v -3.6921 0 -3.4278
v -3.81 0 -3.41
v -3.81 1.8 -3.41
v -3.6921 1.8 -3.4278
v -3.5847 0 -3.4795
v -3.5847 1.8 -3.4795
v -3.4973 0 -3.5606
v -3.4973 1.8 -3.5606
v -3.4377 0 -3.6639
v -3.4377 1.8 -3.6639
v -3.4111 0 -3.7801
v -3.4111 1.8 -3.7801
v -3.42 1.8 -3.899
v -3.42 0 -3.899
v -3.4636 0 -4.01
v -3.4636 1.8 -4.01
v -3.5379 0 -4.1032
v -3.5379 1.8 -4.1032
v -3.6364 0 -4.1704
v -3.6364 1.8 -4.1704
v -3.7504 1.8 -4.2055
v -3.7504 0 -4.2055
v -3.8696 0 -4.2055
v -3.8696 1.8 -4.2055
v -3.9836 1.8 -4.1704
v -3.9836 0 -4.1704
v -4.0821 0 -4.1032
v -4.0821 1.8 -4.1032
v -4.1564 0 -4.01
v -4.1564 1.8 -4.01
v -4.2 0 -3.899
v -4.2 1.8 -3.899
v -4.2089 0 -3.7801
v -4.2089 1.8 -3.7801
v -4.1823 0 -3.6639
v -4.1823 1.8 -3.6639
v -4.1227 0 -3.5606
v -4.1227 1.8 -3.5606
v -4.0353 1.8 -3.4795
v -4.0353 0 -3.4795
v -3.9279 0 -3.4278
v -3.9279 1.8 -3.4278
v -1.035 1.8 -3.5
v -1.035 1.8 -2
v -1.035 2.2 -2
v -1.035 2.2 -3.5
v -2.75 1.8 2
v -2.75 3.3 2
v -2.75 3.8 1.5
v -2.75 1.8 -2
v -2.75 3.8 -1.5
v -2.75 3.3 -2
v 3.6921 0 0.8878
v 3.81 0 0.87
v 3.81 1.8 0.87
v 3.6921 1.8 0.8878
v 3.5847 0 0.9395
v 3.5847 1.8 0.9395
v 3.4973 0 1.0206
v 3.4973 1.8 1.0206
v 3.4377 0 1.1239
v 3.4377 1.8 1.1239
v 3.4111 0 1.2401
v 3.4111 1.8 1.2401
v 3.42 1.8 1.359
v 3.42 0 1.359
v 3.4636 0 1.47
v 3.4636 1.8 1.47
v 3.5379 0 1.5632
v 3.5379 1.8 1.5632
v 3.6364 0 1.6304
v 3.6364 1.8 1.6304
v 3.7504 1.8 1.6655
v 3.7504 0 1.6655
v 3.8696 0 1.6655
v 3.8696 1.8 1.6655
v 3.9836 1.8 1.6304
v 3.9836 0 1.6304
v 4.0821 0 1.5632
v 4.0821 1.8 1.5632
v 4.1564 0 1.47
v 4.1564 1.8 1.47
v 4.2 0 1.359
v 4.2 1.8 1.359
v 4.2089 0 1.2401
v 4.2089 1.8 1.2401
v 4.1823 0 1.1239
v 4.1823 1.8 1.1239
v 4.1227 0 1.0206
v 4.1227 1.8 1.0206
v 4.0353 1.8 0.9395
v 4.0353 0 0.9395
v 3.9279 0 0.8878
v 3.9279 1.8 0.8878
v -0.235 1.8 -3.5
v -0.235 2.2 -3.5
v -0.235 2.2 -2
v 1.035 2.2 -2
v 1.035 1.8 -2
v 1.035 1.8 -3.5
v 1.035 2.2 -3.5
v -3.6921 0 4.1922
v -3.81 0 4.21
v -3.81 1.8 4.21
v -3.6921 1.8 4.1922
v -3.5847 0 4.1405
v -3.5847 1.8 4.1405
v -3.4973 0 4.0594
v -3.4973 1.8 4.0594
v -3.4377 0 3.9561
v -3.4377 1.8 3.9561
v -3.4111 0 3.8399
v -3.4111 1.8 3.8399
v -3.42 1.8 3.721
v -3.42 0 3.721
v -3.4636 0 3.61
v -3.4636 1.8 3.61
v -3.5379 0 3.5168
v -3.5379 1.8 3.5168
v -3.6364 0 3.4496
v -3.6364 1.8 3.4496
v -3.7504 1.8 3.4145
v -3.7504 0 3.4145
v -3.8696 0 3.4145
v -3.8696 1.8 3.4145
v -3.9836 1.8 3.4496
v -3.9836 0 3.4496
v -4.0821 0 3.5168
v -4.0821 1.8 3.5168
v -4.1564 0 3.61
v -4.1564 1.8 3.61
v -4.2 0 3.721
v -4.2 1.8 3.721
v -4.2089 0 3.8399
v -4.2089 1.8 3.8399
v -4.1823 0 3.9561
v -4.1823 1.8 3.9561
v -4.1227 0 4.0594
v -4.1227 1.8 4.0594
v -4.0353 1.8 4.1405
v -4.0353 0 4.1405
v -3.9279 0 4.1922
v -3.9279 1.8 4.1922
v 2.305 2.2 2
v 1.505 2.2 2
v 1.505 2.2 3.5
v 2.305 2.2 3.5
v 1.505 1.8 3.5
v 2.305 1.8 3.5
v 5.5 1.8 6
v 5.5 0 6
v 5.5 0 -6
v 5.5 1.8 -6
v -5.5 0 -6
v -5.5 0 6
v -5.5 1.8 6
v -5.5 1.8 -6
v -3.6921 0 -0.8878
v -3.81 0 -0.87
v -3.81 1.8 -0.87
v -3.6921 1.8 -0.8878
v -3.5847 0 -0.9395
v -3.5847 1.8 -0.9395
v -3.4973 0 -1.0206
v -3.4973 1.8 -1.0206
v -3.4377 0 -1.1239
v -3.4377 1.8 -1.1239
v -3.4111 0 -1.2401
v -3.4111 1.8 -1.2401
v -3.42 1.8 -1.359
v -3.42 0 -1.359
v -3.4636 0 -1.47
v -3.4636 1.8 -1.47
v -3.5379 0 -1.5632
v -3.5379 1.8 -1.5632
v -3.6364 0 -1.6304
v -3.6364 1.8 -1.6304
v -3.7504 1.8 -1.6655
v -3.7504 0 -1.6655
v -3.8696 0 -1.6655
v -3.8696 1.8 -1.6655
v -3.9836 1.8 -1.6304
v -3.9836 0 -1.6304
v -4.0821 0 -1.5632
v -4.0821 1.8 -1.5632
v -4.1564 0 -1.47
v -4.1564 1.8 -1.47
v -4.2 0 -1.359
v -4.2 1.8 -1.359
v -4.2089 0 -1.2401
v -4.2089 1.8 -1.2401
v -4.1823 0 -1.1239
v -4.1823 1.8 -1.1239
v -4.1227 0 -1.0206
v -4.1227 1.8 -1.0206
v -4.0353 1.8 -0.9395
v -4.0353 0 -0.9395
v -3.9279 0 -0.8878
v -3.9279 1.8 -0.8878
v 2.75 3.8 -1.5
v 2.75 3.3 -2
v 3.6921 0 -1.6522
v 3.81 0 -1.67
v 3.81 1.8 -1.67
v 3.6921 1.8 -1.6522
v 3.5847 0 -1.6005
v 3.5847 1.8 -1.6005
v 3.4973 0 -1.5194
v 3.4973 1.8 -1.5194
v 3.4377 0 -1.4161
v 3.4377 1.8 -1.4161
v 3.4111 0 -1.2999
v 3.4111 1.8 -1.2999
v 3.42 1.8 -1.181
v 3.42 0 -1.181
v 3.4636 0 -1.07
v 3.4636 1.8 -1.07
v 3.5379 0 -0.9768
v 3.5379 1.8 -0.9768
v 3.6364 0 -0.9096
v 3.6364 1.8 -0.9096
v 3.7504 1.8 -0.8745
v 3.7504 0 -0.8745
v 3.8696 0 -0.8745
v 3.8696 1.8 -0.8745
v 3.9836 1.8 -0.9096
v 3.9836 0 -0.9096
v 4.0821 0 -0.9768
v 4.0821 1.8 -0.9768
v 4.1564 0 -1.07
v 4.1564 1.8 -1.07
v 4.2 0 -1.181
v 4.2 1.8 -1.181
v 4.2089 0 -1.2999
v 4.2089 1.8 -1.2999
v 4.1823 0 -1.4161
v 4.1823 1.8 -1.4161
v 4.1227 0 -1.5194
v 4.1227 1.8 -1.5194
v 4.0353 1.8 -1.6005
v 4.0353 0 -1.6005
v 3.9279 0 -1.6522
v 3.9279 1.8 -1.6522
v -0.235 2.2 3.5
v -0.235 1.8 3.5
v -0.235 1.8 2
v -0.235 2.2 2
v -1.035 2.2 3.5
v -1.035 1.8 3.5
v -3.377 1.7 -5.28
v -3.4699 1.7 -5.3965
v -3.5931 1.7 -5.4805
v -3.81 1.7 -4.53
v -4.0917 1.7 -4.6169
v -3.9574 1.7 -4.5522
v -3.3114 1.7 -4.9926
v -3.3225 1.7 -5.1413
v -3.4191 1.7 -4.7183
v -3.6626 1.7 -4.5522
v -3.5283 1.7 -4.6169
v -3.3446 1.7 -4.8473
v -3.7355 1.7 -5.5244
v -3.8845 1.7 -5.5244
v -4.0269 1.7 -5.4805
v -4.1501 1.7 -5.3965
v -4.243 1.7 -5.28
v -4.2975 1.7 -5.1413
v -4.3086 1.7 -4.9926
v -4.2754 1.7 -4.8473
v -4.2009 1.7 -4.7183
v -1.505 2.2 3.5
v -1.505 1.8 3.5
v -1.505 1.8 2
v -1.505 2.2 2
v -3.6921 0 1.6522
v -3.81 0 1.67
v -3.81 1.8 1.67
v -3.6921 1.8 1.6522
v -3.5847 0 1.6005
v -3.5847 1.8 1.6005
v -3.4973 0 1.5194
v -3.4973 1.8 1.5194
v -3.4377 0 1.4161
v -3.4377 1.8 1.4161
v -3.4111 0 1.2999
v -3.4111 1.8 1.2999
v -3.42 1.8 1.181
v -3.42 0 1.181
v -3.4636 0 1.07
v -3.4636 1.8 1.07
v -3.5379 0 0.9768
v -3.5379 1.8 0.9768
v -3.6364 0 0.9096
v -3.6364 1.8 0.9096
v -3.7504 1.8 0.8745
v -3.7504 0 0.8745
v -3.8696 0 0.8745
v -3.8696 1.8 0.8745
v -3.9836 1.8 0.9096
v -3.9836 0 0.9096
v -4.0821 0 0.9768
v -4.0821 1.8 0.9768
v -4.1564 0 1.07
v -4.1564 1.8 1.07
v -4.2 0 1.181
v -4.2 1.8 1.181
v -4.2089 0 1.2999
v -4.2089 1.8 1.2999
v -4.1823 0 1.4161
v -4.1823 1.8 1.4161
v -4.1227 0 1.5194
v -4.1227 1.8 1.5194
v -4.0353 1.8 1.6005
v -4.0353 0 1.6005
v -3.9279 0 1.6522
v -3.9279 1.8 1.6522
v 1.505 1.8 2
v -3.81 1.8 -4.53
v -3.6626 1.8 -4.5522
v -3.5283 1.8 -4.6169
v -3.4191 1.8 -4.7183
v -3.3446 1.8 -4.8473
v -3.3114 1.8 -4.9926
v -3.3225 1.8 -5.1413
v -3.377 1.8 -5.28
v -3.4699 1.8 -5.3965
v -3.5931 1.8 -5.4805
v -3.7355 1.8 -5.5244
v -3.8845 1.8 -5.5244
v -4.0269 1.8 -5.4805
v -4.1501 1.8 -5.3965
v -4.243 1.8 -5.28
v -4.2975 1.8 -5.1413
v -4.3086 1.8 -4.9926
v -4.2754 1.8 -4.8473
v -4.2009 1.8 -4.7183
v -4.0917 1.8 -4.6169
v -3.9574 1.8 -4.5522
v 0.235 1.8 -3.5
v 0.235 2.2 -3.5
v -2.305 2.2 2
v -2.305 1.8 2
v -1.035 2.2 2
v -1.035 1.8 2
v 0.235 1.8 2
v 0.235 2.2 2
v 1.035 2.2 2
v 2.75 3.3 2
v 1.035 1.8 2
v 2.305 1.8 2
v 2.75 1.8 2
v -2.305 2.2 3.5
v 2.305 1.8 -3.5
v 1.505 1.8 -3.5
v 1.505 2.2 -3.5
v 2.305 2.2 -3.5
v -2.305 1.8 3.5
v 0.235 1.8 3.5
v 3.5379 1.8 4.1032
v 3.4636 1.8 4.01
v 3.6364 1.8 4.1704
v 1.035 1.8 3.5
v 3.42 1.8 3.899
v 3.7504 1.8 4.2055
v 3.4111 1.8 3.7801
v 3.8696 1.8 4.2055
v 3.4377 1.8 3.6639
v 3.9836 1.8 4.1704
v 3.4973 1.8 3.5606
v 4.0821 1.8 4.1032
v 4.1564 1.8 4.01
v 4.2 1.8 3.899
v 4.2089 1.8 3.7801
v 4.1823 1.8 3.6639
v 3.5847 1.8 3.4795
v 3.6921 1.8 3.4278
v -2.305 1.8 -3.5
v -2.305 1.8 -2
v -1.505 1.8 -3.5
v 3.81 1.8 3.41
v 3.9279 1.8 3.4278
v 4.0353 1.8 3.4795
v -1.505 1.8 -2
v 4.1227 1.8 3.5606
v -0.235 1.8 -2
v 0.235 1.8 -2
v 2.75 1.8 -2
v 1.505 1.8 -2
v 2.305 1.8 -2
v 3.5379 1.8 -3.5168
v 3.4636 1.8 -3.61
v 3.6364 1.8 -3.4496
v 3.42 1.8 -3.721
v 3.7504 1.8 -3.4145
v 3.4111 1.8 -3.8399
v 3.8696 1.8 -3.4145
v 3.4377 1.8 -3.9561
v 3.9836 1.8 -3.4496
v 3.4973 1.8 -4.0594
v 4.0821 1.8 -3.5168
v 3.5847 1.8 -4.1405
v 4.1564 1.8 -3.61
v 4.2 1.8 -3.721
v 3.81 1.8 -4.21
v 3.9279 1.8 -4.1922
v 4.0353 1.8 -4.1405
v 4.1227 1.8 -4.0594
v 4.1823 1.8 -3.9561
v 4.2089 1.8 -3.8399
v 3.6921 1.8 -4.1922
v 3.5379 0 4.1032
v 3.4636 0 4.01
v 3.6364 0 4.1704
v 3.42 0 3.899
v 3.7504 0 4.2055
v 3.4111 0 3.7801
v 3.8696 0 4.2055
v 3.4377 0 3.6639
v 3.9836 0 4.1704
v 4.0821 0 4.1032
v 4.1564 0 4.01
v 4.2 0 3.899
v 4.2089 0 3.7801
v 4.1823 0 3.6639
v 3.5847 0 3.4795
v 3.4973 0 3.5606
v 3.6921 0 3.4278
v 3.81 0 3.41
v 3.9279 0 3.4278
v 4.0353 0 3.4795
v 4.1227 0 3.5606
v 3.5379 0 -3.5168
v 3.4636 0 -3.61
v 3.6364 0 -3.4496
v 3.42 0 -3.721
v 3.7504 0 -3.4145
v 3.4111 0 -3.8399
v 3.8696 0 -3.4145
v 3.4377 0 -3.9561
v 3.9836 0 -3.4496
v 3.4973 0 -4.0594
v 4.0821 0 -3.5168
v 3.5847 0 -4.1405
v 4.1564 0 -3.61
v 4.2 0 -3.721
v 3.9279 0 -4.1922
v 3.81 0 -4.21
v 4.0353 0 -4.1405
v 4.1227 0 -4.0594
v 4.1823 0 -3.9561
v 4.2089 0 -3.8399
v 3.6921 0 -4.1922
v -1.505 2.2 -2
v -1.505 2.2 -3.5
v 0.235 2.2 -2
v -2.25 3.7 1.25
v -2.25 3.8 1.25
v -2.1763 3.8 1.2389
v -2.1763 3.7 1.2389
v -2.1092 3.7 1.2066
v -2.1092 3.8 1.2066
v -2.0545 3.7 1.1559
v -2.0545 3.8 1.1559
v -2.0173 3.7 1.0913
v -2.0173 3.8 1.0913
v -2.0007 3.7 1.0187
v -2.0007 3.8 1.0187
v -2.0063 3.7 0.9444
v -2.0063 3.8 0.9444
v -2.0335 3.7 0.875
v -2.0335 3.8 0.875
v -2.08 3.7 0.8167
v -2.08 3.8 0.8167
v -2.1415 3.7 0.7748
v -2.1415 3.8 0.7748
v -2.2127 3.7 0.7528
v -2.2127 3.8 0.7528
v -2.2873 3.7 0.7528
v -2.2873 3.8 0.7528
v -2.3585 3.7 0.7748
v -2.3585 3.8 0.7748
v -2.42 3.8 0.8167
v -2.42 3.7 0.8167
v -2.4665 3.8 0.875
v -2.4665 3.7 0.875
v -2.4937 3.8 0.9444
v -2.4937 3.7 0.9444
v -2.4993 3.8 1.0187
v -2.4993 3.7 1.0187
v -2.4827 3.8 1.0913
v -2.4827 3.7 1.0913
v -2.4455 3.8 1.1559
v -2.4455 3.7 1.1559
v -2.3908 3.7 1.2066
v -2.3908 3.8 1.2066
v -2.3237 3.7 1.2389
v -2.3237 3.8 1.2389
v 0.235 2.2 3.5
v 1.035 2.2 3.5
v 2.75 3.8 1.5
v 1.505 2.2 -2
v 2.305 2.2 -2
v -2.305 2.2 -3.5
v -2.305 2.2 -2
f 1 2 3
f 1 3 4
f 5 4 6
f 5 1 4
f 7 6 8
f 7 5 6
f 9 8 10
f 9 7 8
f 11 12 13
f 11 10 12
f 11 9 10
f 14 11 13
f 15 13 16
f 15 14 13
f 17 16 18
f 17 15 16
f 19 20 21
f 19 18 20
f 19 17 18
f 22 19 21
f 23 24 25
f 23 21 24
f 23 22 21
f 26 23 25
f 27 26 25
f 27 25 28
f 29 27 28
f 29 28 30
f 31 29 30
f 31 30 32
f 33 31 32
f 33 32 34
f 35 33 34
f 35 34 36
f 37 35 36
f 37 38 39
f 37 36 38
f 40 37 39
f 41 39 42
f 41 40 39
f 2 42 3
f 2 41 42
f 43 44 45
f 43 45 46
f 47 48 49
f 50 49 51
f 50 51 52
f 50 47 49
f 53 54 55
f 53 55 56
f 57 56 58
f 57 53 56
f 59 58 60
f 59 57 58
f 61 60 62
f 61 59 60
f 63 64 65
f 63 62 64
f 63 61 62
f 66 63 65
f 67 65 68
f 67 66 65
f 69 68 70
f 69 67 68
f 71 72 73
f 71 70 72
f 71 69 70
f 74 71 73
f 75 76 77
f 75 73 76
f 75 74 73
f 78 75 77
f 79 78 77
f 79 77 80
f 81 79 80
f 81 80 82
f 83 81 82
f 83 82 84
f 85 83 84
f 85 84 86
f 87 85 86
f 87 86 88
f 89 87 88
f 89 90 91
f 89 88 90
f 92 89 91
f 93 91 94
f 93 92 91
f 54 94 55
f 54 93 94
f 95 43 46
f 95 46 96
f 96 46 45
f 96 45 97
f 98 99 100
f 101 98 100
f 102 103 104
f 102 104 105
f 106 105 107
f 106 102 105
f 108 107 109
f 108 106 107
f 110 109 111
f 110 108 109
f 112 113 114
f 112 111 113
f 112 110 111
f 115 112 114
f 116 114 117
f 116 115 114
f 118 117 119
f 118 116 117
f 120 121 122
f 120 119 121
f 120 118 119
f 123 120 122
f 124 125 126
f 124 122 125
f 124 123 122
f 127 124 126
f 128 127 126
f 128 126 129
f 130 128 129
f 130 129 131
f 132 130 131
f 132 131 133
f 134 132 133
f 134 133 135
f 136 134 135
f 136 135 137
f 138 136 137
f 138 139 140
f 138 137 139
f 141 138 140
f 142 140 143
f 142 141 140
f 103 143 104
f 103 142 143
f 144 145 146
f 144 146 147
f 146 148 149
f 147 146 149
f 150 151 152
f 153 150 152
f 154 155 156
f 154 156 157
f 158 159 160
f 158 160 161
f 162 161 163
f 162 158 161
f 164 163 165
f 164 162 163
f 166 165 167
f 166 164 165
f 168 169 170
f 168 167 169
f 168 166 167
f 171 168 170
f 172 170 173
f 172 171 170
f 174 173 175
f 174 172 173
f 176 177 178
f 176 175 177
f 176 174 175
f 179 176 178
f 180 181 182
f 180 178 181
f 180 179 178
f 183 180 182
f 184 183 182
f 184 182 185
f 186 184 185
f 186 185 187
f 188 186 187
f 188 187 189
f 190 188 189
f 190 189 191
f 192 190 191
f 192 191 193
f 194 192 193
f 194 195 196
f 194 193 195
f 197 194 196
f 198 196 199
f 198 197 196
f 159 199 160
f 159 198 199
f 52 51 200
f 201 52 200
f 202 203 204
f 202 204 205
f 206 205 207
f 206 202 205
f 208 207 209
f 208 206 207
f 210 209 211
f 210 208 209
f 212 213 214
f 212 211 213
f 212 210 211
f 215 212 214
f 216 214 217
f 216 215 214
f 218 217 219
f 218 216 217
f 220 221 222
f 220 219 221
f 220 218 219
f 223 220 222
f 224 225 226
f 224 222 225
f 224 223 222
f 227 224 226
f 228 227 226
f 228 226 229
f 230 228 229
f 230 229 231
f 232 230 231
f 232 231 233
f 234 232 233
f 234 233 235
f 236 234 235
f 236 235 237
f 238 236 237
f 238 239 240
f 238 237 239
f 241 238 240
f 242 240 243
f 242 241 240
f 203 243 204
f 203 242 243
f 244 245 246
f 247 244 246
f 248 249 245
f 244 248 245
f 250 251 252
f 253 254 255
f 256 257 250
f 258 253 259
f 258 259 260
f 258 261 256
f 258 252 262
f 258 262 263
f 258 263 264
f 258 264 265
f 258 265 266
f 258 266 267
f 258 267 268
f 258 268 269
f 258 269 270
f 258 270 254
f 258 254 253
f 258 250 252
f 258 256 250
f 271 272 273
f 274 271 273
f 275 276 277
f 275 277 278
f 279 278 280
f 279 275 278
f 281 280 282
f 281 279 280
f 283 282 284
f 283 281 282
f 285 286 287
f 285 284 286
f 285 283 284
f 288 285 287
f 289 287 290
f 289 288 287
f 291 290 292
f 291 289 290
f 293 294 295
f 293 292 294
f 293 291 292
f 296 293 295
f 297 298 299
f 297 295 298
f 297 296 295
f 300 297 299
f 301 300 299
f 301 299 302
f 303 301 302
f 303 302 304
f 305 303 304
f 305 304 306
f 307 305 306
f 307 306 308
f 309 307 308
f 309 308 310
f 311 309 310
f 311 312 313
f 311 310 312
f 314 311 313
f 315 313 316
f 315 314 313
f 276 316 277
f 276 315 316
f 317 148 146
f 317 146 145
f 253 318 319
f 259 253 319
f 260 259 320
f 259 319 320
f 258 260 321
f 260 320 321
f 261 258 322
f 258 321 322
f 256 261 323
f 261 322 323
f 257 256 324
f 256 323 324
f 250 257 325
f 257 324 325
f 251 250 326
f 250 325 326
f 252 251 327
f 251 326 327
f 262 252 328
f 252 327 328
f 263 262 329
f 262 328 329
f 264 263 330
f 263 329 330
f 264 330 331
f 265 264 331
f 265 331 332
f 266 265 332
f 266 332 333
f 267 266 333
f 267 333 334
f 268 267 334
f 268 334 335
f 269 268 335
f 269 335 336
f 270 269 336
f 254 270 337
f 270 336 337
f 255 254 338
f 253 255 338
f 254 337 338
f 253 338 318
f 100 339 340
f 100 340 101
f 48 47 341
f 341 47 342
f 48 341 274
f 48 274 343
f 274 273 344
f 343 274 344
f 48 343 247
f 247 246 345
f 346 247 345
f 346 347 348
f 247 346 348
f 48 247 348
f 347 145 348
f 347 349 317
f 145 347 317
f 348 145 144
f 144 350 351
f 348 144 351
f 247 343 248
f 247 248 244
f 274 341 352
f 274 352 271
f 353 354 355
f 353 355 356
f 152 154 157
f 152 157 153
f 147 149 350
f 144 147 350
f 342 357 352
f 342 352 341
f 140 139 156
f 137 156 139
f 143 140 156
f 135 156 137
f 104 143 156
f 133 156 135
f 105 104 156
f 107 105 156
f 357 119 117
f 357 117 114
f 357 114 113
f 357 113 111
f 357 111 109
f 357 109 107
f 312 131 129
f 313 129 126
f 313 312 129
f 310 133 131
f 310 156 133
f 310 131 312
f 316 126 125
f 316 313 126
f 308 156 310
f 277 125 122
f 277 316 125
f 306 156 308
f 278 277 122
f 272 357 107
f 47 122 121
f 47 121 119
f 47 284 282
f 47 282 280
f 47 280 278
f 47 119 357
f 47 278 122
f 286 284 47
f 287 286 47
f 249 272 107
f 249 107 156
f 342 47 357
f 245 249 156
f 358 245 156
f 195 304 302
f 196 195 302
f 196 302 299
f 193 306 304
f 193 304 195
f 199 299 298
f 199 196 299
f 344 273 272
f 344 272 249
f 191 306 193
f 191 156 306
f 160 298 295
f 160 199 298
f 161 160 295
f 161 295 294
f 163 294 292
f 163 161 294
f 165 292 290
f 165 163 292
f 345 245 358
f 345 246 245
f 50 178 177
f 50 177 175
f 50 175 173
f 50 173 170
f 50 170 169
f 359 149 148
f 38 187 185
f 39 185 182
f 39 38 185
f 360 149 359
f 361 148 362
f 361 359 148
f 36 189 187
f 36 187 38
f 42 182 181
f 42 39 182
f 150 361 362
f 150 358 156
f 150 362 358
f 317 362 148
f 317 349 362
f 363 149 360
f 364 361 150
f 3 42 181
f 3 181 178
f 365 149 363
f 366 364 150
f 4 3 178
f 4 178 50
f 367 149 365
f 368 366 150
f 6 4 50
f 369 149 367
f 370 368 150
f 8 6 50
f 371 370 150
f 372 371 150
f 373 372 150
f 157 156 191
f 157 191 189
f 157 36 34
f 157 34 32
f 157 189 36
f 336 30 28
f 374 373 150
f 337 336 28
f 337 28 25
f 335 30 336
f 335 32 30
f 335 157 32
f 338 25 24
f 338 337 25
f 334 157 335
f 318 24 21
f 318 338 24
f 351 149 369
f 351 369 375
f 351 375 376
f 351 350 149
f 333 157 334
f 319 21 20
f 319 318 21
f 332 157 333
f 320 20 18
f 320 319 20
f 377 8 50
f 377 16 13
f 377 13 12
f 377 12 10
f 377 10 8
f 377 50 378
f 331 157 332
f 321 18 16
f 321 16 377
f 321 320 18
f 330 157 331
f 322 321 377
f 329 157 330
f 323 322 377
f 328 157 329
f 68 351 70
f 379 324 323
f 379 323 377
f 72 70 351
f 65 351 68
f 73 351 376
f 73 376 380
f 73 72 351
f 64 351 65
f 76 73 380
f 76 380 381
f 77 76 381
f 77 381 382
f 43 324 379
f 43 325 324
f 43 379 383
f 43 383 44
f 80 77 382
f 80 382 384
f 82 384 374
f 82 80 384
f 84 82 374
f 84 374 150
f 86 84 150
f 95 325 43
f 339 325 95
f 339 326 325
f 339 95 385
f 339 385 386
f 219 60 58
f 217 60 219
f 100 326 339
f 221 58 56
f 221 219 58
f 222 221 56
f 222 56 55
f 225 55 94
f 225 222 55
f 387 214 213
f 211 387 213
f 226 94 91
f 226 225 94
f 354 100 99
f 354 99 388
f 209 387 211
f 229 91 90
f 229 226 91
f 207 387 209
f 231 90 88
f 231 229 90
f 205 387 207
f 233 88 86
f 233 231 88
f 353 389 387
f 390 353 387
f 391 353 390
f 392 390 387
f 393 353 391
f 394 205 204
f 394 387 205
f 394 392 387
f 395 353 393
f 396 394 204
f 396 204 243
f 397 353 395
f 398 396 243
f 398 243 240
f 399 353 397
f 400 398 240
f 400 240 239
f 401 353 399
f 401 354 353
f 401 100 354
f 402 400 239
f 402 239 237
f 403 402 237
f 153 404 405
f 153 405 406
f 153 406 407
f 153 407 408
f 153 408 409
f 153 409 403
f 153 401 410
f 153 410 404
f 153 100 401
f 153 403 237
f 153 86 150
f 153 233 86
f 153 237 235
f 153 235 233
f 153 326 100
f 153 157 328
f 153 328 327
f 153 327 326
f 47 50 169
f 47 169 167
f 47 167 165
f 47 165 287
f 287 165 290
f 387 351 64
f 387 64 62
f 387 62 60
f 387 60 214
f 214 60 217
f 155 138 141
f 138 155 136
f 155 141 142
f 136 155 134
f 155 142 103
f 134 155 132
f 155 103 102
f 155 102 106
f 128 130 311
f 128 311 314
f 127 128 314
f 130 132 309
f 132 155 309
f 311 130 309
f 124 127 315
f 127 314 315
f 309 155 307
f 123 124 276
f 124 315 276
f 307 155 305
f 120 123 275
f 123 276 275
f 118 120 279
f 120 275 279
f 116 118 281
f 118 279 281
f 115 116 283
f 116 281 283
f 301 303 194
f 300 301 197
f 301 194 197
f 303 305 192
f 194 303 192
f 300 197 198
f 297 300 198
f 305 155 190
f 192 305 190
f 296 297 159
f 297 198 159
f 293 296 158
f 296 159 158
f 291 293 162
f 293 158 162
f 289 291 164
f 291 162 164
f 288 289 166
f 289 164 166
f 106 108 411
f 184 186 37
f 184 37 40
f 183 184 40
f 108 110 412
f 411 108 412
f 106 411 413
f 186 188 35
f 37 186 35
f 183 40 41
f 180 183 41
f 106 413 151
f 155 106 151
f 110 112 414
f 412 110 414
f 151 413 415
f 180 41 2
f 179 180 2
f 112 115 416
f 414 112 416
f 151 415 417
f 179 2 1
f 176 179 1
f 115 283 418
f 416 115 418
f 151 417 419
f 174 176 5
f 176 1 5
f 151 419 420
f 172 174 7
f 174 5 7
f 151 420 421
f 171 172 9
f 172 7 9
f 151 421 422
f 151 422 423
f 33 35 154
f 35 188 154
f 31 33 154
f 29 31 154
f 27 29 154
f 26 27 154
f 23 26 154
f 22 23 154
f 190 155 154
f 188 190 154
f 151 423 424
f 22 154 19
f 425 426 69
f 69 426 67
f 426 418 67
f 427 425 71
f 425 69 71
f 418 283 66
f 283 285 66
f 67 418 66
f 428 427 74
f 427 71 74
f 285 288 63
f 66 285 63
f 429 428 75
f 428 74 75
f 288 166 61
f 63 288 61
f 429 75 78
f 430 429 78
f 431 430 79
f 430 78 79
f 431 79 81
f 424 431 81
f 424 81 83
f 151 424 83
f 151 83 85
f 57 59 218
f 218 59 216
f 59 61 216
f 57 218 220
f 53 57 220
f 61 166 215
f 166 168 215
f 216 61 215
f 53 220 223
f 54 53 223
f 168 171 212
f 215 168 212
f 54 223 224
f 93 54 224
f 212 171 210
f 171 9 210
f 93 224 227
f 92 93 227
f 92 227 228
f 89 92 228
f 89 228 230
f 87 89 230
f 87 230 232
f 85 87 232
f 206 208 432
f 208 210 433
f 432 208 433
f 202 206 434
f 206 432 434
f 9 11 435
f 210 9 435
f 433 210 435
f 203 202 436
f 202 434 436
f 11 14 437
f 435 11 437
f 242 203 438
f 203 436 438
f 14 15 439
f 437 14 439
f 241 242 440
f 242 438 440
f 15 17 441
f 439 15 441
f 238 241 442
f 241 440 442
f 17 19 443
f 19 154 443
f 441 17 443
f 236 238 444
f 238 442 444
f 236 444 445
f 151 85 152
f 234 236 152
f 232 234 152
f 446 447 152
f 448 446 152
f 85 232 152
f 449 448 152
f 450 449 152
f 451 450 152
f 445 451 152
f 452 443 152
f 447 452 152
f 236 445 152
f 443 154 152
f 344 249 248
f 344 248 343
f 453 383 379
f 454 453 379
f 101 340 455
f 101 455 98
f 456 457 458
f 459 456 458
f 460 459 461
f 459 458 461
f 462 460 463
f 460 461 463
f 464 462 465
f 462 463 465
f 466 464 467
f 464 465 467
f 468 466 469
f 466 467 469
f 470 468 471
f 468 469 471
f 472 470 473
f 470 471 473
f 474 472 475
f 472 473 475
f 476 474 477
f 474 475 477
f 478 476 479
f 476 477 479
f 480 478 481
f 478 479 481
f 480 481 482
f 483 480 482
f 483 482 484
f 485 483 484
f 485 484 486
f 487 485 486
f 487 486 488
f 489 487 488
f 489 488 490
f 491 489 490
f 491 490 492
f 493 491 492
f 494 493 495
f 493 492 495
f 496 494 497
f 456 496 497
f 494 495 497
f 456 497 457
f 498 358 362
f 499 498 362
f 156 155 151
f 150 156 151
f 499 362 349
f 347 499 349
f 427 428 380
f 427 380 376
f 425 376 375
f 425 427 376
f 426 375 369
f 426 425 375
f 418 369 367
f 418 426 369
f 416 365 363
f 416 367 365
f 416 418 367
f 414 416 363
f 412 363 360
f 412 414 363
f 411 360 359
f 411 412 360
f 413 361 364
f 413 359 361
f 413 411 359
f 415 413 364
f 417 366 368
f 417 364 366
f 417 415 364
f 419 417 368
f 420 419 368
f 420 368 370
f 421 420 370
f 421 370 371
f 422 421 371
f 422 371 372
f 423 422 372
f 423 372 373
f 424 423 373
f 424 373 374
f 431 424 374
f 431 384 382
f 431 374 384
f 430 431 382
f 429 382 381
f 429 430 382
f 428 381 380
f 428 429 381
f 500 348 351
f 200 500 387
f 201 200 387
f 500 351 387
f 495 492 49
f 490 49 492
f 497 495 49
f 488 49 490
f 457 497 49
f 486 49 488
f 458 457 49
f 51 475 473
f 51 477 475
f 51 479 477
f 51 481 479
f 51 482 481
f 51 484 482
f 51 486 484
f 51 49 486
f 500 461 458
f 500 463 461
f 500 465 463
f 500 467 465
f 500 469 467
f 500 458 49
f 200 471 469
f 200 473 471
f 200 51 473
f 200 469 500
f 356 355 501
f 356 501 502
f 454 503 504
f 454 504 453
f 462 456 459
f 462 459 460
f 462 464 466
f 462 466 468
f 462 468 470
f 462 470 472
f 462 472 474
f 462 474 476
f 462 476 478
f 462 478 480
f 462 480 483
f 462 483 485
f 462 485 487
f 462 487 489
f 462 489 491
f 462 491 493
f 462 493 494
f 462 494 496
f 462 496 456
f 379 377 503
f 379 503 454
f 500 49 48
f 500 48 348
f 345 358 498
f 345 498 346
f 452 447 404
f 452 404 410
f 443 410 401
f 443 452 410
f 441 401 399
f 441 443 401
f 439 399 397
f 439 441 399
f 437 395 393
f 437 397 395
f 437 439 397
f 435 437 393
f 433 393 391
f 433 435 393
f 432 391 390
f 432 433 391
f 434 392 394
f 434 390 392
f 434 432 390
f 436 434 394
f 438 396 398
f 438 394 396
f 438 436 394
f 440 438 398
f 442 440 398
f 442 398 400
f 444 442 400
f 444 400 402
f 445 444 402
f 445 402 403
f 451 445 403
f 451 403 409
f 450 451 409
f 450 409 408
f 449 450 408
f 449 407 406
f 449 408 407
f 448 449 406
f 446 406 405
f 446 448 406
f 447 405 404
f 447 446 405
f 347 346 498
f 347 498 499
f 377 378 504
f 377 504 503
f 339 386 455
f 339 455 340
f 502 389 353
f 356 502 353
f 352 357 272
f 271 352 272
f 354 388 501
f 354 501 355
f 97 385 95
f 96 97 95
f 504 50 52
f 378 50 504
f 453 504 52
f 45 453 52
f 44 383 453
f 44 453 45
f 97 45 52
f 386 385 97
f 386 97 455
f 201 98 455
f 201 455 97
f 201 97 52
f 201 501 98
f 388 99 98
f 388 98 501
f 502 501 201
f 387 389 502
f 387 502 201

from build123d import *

# Parameters (mm, degrees)
SKETCH1_W               = 11
SKETCH1_H               = 12
BOSS_EXTRUDE1_DEPTH     = 1.8
SKETCH2_W               = 2.54
SKETCH2_H               = 10.16
BOSS_EXTRUDE2_DEPTH     = 2.54
BOSS_EXTRUDE3_START     = -5.84
SKETCH3_W               = 0.5
SKETCH3_H               = 0.5
BOSS_EXTRUDE3_DEPTH     = 12.34
SKETCH4_W               = 5.5
SKETCH4_H               = 4
BOSS_EXTRUDE4_DEPTH     = 2
CHAMFER1_SIZE           = 0.5
SKETCH5_W               = 0.8
SKETCH5_H               = 7
BOSS_EXTRUDE5_DEPTH     = 0.4
SKETCH6_R               = 0.5
CUT_EXTRUDE1_DEPTH      = 0.1
SKETCH7_R               = 0.25
CUT_EXTRUDE2_DEPTH      = 0.1
SKETCH9_W               = 11
SKETCH9_H               = 12
CUT_EXTRUDE3_DEPTH      = 31
CUT_EXTRUDE4_DEPTH      = 9.381527307
CUT_EXTRUDE4_DEPTH_BACK = 9.381527307
SKETCH10_R              = 0.4


with BuildPart() as part:
    # Sketch1 → Boss-Extrude1 (new body)
    with BuildSketch(Plane(origin=(0, 0, 0), x_dir=(1, 0, 0), z_dir=(0, 1, 0))):
        Rectangle(SKETCH1_W, SKETCH1_H)
    extrude(amount=BOSS_EXTRUDE1_DEPTH)

    # Sketch2 → Boss-Extrude2 (add)
    with BuildSketch(Plane.XZ):
        with Locations((-3.81, 0)):
            Rectangle(SKETCH2_W, SKETCH2_H)
        with Locations((3.81, 0)):
            Rectangle(SKETCH2_W, SKETCH2_H)
    extrude(amount=BOSS_EXTRUDE2_DEPTH)

    # Sketch3 → Boss-Extrude3 (add)
    with BuildSketch(Plane.XZ.offset(2.54).offset(BOSS_EXTRUDE3_START)):
        with Locations((3.81, 1.27)):
            Rectangle(SKETCH3_W, SKETCH3_H)
        with Locations((3.81, 3.81)):
            Rectangle(SKETCH3_W, SKETCH3_H)
        with Locations((3.81, -1.27)):
            Rectangle(SKETCH3_W, SKETCH3_H)
        with Locations((3.81, -3.81)):
            Rectangle(SKETCH3_W, SKETCH3_H)
    boss_extrude3 = extrude(amount=BOSS_EXTRUDE3_DEPTH)

    # Mirror1: Boss-Extrude3 across plane
    add(boss_extrude3.mirror(Plane(origin=(0, 0, 0), x_dir=(0, 0, 1), z_dir=(1, 0, 0))))

    # Sketch4 → Boss-Extrude4 (add)
    with BuildSketch(Plane(origin=(0, 1.8, 0), x_dir=(1, 0, 0), z_dir=(0, 1, 0))):
        Rectangle(SKETCH4_W, SKETCH4_H)
    extrude(amount=BOSS_EXTRUDE4_DEPTH)

    # Chamfer1
    chamfer1_edges = [part.edges().sort_by_distance(p)[0] for p in [
        (0, 3.8, -2),
        (0, 3.8, 2),
    ]]
    chamfer(chamfer1_edges, length=CHAMFER1_SIZE)

    # Sketch5 → Boss-Extrude5 (add)
    with BuildSketch(Plane(origin=(0, 1.8, 0), x_dir=(1, 0, 0), z_dir=(0, 1, 0))):
        with Locations((-0.635, 0)):
            Rectangle(SKETCH5_W, SKETCH5_H)
        with Locations((-1.905, 0)):
            Rectangle(SKETCH5_W, SKETCH5_H)
        with Locations((0.635, 0)):
            Rectangle(SKETCH5_W, SKETCH5_H)
        with Locations((1.905, 0)):
            Rectangle(SKETCH5_W, SKETCH5_H)
    extrude(amount=BOSS_EXTRUDE5_DEPTH)

    # Sketch6 → Cut-Extrude1 (cut)
    with BuildSketch(Plane(origin=(0, 1.8, 0), x_dir=(1, 0, 0), z_dir=(0, 1, 0))):
        with Locations(Location((-3.81, 5.03, 0), (0, 0, 270))):
            Circle(SKETCH6_R)
    extrude(amount=-CUT_EXTRUDE1_DEPTH, mode=Mode.SUBTRACT)

    # Sketch7 → Cut-Extrude2 (cut)
    with BuildSketch(Plane(origin=(0, 3.8, 0), x_dir=(1, 0, 0), z_dir=(0, 1, 0))):
        with Locations(Location((-2.25, -1, 0), (0, 0, 270))):
            Circle(SKETCH7_R)
    extrude(amount=-CUT_EXTRUDE2_DEPTH, mode=Mode.SUBTRACT)

    # Sketch9 → Cut-Extrude3 (cut)
    with BuildSketch(Plane.XZ):
        Rectangle(SKETCH9_W, SKETCH9_H)
    extrude(amount=CUT_EXTRUDE3_DEPTH, mode=Mode.SUBTRACT)

    # Sketch10 → Cut-Extrude4 (cut, two sides: drawn at the far end of the back side and taken through both)
    with BuildSketch(Plane(origin=(0, 1.8, 0), x_dir=(1, 0, 0), z_dir=(0, 1, 0)).offset(-CUT_EXTRUDE4_DEPTH_BACK)):
        with Locations(Location((-3.81, -3.81, 0), (0, 0, 270))):
            Circle(SKETCH10_R)
        with Locations(Location((-3.81, -1.27, 0), (0, 0, 270))):
            Circle(SKETCH10_R)
        with Locations(Location((-3.81, 1.27, 0), (0, 0, 270))):
            Circle(SKETCH10_R)
        with Locations(Location((-3.81, 3.81, 0), (0, 0, 270))):
            Circle(SKETCH10_R)
        with Locations(Location((3.81, -3.81, 0), (0, 0, 90))):
            Circle(SKETCH10_R)
        with Locations(Location((3.81, -1.27, 0), (0, 0, 90))):
            Circle(SKETCH10_R)
        with Locations(Location((3.81, 1.27, 0), (0, 0, 90))):
            Circle(SKETCH10_R)
        with Locations(Location((3.81, 3.81, 0), (0, 0, 90))):
            Circle(SKETCH10_R)
    extrude(amount=CUT_EXTRUDE4_DEPTH + CUT_EXTRUDE4_DEPTH_BACK, mode=Mode.SUBTRACT)


solid = part.part
